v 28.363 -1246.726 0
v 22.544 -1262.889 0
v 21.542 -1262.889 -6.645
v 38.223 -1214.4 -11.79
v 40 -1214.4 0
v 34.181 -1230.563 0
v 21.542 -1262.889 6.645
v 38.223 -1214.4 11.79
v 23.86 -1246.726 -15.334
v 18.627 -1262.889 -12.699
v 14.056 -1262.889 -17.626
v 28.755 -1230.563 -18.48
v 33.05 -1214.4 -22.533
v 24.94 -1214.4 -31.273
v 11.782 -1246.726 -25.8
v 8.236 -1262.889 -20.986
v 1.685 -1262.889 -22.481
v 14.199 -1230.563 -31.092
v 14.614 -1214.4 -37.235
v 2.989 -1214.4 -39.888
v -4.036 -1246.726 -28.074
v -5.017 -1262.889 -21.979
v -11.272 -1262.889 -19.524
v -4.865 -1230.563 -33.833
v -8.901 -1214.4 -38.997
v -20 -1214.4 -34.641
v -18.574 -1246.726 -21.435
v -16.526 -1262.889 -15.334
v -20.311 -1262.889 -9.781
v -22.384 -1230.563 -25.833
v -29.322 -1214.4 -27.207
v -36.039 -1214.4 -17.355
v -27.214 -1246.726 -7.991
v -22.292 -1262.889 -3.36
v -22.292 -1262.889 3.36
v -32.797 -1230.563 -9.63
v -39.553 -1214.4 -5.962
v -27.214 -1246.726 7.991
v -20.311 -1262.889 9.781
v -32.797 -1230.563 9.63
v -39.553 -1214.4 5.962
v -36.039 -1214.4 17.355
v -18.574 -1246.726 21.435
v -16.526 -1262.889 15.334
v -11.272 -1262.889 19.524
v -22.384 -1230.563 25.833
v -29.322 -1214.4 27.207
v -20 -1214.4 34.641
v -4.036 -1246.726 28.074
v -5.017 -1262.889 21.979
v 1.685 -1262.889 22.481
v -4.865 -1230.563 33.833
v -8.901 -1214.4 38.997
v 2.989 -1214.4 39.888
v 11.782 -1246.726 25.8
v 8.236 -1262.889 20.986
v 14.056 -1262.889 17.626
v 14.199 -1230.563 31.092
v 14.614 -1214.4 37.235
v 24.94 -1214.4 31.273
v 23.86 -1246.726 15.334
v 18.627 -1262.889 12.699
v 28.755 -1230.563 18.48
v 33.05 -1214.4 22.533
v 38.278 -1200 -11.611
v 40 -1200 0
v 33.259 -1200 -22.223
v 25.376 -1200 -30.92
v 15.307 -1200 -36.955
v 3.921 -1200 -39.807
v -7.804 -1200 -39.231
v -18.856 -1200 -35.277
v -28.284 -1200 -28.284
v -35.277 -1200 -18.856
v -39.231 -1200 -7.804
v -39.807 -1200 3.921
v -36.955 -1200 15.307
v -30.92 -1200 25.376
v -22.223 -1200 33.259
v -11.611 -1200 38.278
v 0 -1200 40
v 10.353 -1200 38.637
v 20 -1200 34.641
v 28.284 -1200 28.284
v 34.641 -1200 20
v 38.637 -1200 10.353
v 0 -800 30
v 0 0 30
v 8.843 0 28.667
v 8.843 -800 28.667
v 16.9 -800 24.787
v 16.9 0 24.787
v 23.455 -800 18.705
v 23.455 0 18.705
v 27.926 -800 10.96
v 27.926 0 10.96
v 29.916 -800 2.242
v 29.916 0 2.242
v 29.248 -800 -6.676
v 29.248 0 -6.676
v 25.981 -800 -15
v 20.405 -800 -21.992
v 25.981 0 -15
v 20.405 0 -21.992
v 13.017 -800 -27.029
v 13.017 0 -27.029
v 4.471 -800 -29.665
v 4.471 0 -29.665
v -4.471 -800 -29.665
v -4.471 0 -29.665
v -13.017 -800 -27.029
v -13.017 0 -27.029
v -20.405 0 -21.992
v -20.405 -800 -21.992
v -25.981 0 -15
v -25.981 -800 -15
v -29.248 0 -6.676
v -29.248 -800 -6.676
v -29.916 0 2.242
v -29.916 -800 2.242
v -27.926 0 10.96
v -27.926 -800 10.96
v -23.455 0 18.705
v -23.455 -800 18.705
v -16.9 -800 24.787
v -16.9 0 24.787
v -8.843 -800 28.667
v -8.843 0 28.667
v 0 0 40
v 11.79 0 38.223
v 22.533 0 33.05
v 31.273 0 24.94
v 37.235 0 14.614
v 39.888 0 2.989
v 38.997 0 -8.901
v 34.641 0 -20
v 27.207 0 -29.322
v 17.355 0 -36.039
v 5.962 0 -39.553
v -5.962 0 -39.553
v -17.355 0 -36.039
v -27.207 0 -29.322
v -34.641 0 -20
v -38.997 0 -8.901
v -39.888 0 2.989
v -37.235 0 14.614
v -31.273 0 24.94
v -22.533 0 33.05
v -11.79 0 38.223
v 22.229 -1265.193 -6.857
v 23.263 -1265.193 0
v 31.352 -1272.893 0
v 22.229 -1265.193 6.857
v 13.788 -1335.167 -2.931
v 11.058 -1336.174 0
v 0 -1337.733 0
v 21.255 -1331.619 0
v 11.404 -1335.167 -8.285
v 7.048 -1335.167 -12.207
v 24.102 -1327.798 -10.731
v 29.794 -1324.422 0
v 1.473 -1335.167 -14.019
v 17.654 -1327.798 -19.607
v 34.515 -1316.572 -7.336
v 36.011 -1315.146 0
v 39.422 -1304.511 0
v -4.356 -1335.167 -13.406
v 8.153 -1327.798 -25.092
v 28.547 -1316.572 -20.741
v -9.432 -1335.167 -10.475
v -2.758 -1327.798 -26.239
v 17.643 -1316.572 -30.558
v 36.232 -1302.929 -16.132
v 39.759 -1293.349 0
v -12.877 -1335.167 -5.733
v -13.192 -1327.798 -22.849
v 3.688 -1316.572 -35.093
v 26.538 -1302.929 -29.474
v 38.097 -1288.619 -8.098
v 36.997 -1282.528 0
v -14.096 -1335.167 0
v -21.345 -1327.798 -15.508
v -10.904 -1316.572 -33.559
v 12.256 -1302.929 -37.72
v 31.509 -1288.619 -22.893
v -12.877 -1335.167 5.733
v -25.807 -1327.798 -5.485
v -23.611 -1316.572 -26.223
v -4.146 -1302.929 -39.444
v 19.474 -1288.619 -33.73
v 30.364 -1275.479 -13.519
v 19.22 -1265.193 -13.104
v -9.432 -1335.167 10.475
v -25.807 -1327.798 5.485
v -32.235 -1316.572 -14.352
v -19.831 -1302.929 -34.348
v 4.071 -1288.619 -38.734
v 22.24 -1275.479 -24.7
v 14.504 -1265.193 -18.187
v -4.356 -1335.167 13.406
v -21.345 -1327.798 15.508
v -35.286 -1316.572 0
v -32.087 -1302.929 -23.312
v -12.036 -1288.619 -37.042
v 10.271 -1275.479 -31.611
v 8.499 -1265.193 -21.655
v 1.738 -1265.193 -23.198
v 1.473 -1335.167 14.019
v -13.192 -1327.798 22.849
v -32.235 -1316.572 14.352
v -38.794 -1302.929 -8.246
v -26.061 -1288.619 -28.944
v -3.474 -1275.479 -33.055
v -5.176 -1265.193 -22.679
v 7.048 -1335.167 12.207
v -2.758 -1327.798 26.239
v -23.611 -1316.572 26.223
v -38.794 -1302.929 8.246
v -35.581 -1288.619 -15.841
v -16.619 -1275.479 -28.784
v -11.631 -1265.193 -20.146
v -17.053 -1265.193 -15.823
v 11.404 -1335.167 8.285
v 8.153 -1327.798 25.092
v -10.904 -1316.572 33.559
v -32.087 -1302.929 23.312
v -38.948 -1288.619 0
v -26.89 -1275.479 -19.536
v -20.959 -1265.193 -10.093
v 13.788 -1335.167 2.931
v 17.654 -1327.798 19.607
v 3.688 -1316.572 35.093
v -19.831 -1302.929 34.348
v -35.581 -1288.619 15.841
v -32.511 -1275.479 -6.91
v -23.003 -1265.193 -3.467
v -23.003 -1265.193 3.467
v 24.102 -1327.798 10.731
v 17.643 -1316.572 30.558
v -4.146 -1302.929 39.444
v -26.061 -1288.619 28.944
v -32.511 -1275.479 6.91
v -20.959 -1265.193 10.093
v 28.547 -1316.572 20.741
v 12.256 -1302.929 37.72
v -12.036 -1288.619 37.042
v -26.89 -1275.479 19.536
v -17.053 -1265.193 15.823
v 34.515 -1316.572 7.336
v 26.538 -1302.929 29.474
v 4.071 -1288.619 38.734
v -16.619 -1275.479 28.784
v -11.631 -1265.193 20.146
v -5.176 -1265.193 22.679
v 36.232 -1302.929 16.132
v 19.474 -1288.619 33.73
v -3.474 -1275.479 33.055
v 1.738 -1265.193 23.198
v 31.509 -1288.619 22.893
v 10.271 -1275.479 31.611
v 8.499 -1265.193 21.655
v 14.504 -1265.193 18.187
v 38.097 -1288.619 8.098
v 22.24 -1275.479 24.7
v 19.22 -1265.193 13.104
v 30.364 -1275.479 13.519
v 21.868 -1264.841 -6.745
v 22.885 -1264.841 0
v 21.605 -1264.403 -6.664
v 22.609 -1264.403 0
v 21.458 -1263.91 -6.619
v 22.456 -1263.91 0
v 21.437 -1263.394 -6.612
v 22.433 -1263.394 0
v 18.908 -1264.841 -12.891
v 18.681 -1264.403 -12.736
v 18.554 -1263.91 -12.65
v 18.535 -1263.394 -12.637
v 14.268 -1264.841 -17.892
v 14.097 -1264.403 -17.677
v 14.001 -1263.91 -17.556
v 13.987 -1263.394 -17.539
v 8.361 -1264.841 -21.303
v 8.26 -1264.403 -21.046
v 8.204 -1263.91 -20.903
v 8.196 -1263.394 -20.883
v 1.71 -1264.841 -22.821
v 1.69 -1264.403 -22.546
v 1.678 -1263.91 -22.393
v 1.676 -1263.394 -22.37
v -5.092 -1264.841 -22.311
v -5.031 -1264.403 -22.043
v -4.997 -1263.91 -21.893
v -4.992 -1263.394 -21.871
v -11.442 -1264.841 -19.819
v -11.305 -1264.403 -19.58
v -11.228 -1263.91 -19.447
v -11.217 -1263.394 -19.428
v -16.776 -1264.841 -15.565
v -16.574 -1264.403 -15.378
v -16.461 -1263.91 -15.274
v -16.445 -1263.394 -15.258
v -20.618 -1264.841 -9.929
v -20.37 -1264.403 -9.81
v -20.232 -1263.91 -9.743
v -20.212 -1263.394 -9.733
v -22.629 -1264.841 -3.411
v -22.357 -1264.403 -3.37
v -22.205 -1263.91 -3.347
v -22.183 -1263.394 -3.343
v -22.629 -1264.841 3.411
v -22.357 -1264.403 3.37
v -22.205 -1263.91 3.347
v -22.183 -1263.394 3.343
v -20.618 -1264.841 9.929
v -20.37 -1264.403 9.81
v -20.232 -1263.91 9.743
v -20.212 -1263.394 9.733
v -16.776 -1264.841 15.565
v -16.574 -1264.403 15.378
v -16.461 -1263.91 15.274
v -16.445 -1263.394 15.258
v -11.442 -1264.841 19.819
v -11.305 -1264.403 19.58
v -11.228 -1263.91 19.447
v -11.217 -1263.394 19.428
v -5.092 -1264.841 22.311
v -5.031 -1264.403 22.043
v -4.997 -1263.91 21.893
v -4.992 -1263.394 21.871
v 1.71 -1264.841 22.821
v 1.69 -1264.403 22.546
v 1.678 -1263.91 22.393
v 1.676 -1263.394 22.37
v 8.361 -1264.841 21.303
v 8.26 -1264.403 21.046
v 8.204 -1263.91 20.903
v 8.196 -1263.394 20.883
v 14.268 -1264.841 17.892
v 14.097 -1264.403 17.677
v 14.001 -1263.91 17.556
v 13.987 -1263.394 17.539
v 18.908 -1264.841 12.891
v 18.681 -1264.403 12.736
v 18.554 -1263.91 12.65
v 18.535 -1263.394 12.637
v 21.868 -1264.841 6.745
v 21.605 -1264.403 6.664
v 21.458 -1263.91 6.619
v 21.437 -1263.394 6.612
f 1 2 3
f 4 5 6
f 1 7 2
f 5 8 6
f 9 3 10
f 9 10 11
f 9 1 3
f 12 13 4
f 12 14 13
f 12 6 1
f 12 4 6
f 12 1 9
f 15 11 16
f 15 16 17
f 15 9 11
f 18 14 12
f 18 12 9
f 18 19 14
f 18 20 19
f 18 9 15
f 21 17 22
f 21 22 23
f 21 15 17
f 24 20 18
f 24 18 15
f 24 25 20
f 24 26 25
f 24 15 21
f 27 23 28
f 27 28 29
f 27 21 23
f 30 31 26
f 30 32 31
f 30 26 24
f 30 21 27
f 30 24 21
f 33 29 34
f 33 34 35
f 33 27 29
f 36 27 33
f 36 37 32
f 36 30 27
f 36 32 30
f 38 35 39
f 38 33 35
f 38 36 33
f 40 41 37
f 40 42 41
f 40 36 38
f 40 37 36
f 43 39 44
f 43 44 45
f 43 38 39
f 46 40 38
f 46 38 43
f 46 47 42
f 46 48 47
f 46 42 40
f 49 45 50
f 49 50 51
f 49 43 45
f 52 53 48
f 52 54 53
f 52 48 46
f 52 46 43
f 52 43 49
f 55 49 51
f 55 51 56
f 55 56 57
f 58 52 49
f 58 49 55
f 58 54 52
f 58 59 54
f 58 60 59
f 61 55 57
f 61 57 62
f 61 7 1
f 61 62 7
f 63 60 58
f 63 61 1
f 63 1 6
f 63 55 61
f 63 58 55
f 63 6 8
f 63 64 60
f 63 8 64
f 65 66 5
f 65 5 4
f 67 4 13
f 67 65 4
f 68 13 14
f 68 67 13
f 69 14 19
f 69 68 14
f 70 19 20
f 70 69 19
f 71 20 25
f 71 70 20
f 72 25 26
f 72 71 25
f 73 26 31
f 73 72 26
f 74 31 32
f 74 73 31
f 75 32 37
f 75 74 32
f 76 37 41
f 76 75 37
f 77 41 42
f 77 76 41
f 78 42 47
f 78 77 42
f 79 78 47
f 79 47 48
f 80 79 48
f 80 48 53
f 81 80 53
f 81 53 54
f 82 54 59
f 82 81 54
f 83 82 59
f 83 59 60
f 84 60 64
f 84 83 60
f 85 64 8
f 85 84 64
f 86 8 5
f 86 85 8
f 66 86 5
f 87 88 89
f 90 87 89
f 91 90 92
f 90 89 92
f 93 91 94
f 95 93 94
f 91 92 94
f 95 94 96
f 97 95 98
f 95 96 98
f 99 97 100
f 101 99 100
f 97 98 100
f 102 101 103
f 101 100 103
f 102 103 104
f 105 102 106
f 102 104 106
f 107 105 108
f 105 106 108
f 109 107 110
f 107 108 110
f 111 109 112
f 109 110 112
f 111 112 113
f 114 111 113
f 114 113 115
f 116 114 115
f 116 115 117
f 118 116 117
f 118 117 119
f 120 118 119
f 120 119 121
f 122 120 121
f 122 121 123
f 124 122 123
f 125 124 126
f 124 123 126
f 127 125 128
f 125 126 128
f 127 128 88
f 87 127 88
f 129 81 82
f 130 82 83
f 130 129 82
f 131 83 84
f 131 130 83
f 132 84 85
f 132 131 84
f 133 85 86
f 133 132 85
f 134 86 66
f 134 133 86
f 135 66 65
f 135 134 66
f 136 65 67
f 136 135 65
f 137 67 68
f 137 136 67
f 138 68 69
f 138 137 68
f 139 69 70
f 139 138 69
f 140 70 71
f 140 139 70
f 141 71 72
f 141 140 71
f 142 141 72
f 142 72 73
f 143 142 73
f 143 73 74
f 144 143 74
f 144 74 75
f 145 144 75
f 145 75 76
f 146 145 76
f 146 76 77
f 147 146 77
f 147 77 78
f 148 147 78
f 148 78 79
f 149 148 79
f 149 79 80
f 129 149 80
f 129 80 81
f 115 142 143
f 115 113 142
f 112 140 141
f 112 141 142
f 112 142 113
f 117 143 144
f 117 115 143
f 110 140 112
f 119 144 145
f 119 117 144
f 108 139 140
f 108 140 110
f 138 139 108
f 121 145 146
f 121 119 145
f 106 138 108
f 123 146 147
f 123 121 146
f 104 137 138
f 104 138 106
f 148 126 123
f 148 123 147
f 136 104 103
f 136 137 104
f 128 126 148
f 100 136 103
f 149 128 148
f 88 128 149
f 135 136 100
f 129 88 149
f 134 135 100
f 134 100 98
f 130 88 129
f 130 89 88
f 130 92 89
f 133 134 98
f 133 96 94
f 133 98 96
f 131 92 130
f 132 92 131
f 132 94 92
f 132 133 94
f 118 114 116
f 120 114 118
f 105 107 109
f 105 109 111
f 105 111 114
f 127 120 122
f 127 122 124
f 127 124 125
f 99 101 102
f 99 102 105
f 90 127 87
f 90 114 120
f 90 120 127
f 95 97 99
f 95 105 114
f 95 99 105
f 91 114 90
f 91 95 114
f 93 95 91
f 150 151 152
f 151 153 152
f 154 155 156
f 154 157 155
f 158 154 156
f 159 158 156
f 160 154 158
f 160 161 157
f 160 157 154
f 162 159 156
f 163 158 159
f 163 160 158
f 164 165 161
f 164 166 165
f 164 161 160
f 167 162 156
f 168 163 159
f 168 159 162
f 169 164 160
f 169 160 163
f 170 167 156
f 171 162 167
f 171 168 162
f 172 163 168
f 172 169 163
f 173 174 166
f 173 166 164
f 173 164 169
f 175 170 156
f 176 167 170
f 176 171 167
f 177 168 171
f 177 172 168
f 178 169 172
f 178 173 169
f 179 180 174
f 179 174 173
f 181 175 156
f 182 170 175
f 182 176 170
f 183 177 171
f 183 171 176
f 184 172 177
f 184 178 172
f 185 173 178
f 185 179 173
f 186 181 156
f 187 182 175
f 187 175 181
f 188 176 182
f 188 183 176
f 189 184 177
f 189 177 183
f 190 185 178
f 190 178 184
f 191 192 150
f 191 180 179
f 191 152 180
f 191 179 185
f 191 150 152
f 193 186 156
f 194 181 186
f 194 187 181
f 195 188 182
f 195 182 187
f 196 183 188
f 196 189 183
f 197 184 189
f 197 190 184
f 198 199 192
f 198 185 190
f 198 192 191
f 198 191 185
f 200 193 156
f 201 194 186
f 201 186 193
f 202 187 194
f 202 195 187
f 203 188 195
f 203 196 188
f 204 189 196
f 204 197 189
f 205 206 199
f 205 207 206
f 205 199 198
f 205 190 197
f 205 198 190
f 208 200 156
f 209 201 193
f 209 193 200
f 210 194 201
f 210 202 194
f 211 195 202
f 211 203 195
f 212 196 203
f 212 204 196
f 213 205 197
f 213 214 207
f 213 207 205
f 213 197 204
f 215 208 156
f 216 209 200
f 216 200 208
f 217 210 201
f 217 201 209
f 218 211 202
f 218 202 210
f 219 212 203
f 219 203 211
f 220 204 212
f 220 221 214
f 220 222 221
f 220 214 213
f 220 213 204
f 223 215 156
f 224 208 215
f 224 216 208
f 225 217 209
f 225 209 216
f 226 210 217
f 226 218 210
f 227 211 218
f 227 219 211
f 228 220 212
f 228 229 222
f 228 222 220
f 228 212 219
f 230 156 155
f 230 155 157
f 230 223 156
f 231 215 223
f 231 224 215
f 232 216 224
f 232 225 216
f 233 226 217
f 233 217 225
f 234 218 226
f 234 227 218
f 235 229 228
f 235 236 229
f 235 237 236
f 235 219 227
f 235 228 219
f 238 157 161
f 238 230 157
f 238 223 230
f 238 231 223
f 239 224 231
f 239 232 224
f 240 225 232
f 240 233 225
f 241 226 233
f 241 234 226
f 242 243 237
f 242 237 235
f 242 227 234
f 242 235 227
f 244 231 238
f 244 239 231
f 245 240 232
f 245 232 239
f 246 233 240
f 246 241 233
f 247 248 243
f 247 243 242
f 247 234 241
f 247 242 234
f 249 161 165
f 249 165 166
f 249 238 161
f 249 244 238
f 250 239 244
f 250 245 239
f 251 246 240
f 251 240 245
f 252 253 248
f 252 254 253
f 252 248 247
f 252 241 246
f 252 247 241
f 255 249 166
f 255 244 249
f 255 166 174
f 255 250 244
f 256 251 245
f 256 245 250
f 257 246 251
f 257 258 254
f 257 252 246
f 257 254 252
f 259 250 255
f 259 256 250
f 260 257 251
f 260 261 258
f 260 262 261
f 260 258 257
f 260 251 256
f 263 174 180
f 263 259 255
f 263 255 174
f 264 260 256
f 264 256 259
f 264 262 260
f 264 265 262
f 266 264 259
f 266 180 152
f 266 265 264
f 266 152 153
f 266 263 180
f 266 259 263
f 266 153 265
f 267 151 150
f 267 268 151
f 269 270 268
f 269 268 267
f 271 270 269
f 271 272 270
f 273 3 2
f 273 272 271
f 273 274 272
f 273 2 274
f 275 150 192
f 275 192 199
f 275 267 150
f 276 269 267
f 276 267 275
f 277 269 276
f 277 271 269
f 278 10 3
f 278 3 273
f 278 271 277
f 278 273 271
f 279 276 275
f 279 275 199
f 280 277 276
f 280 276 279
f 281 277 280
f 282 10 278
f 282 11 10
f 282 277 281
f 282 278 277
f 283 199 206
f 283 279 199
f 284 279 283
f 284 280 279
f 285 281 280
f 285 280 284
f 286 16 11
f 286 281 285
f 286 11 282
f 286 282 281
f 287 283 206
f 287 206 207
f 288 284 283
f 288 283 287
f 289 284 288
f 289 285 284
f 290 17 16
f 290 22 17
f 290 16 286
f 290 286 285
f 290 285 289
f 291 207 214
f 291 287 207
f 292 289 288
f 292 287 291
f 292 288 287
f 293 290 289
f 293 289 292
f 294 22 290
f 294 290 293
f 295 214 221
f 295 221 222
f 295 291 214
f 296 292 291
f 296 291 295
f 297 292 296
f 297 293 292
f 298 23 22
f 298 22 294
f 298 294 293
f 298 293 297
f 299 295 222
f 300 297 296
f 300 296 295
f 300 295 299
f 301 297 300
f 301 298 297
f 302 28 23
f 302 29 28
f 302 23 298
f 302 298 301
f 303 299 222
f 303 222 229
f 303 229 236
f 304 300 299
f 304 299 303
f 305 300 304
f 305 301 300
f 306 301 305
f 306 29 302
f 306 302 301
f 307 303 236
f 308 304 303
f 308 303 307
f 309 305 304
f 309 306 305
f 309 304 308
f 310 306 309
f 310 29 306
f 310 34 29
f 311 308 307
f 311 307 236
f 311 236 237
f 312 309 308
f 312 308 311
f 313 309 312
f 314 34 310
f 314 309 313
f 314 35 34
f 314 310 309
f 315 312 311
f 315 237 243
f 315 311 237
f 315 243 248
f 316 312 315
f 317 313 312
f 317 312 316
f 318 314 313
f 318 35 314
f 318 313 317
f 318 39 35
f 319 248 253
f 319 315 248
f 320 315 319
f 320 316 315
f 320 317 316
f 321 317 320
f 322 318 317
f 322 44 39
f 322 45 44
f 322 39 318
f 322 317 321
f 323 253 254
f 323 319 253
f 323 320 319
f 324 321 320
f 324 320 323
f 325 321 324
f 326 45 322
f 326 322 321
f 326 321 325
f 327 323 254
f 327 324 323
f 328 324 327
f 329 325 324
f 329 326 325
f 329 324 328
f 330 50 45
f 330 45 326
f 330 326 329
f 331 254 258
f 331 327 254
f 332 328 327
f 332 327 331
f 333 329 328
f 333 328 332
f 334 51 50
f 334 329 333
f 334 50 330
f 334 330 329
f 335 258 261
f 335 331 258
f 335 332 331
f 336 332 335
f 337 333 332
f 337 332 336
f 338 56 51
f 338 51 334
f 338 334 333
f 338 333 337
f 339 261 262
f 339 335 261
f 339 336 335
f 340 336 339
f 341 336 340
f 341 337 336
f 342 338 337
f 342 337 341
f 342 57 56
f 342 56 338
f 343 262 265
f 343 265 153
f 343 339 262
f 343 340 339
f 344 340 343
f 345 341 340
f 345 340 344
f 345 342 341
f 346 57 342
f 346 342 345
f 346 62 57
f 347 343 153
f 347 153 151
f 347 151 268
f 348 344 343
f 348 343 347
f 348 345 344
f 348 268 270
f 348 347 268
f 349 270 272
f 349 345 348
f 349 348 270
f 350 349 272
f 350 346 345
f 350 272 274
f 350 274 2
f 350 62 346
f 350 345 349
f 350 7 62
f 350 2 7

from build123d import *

# Parameters (mm, degrees)
SKETCH1_R           = 40
EXTRUDE1_DEPTH      = 1200
SKETCH2_R           = 30
CUT_EXTRUDE1_DEPTH  = 800
SKETCH_1_R          = 10
CUT_EXTRUDE_1_DEPTH = 35.6


# Read off the part's stored shape, not the designer's step: 连接重组1
with BuildPart() as part:
    # Sketch1 → Extrude1 (new body)
    with BuildSketch(Plane(origin=(0, 0, 0), x_dir=(1, 0, 0), z_dir=(0, 1, 0))):
        with Locations(Location((0, 0, 0), (0, 0, 270))):
            Circle(SKETCH1_R)
    extrude(amount=-EXTRUDE1_DEPTH)

    # Sketch2 → Cut-Extrude1 (cut)
    with BuildSketch(Plane(origin=(0, 0, 0), x_dir=(1, 0, 0), z_dir=(0, 1, 0))):
        with Locations(Location((0, 0, 0), (0, 0, 270))):
            Circle(SKETCH2_R)
    extrude(amount=-CUT_EXTRUDE1_DEPTH, mode=Mode.SUBTRACT)

    # 草图1 → 切除-拉伸1 (cut)
    with BuildSketch(Plane.XZ.offset(1200)):
        with Locations(Location((0, 0, 0), (0, 0, 270))):
            Circle(SKETCH_1_R)
    extrude(amount=-CUT_EXTRUDE_1_DEPTH, mode=Mode.SUBTRACT)

    # 连接重组1 outline → 连接重组1 (revolve)
    with BuildSketch(Plane.XY):
        with BuildLine():
            ThreePointArc((0, -1337.73332), (38.089361999, -1309.948085758), (23.262631735, -1265.193345126))
            ThreePointArc((23.262631735, -1265.193345126), (22.516451416, -1264.161768918), (22.543988515, -1262.888907458))
            Line((22.543988515, -1262.888907458), (39.999998202, -1214.399991661))
            Line((39.999998202, -1214.399991661), (40, -1200))
            Line((40, -1200), (10, -1200))
            Line((10, -1200), (10, -1164.4))
            Line((10, -1164.4), (0, -1164.4))
            Line((0, -1164.4), (0, -1337.73332))
        make_face()
    revolve(axis=Axis((0, 0, 0), (0, 1, 0)))


solid = part.part
